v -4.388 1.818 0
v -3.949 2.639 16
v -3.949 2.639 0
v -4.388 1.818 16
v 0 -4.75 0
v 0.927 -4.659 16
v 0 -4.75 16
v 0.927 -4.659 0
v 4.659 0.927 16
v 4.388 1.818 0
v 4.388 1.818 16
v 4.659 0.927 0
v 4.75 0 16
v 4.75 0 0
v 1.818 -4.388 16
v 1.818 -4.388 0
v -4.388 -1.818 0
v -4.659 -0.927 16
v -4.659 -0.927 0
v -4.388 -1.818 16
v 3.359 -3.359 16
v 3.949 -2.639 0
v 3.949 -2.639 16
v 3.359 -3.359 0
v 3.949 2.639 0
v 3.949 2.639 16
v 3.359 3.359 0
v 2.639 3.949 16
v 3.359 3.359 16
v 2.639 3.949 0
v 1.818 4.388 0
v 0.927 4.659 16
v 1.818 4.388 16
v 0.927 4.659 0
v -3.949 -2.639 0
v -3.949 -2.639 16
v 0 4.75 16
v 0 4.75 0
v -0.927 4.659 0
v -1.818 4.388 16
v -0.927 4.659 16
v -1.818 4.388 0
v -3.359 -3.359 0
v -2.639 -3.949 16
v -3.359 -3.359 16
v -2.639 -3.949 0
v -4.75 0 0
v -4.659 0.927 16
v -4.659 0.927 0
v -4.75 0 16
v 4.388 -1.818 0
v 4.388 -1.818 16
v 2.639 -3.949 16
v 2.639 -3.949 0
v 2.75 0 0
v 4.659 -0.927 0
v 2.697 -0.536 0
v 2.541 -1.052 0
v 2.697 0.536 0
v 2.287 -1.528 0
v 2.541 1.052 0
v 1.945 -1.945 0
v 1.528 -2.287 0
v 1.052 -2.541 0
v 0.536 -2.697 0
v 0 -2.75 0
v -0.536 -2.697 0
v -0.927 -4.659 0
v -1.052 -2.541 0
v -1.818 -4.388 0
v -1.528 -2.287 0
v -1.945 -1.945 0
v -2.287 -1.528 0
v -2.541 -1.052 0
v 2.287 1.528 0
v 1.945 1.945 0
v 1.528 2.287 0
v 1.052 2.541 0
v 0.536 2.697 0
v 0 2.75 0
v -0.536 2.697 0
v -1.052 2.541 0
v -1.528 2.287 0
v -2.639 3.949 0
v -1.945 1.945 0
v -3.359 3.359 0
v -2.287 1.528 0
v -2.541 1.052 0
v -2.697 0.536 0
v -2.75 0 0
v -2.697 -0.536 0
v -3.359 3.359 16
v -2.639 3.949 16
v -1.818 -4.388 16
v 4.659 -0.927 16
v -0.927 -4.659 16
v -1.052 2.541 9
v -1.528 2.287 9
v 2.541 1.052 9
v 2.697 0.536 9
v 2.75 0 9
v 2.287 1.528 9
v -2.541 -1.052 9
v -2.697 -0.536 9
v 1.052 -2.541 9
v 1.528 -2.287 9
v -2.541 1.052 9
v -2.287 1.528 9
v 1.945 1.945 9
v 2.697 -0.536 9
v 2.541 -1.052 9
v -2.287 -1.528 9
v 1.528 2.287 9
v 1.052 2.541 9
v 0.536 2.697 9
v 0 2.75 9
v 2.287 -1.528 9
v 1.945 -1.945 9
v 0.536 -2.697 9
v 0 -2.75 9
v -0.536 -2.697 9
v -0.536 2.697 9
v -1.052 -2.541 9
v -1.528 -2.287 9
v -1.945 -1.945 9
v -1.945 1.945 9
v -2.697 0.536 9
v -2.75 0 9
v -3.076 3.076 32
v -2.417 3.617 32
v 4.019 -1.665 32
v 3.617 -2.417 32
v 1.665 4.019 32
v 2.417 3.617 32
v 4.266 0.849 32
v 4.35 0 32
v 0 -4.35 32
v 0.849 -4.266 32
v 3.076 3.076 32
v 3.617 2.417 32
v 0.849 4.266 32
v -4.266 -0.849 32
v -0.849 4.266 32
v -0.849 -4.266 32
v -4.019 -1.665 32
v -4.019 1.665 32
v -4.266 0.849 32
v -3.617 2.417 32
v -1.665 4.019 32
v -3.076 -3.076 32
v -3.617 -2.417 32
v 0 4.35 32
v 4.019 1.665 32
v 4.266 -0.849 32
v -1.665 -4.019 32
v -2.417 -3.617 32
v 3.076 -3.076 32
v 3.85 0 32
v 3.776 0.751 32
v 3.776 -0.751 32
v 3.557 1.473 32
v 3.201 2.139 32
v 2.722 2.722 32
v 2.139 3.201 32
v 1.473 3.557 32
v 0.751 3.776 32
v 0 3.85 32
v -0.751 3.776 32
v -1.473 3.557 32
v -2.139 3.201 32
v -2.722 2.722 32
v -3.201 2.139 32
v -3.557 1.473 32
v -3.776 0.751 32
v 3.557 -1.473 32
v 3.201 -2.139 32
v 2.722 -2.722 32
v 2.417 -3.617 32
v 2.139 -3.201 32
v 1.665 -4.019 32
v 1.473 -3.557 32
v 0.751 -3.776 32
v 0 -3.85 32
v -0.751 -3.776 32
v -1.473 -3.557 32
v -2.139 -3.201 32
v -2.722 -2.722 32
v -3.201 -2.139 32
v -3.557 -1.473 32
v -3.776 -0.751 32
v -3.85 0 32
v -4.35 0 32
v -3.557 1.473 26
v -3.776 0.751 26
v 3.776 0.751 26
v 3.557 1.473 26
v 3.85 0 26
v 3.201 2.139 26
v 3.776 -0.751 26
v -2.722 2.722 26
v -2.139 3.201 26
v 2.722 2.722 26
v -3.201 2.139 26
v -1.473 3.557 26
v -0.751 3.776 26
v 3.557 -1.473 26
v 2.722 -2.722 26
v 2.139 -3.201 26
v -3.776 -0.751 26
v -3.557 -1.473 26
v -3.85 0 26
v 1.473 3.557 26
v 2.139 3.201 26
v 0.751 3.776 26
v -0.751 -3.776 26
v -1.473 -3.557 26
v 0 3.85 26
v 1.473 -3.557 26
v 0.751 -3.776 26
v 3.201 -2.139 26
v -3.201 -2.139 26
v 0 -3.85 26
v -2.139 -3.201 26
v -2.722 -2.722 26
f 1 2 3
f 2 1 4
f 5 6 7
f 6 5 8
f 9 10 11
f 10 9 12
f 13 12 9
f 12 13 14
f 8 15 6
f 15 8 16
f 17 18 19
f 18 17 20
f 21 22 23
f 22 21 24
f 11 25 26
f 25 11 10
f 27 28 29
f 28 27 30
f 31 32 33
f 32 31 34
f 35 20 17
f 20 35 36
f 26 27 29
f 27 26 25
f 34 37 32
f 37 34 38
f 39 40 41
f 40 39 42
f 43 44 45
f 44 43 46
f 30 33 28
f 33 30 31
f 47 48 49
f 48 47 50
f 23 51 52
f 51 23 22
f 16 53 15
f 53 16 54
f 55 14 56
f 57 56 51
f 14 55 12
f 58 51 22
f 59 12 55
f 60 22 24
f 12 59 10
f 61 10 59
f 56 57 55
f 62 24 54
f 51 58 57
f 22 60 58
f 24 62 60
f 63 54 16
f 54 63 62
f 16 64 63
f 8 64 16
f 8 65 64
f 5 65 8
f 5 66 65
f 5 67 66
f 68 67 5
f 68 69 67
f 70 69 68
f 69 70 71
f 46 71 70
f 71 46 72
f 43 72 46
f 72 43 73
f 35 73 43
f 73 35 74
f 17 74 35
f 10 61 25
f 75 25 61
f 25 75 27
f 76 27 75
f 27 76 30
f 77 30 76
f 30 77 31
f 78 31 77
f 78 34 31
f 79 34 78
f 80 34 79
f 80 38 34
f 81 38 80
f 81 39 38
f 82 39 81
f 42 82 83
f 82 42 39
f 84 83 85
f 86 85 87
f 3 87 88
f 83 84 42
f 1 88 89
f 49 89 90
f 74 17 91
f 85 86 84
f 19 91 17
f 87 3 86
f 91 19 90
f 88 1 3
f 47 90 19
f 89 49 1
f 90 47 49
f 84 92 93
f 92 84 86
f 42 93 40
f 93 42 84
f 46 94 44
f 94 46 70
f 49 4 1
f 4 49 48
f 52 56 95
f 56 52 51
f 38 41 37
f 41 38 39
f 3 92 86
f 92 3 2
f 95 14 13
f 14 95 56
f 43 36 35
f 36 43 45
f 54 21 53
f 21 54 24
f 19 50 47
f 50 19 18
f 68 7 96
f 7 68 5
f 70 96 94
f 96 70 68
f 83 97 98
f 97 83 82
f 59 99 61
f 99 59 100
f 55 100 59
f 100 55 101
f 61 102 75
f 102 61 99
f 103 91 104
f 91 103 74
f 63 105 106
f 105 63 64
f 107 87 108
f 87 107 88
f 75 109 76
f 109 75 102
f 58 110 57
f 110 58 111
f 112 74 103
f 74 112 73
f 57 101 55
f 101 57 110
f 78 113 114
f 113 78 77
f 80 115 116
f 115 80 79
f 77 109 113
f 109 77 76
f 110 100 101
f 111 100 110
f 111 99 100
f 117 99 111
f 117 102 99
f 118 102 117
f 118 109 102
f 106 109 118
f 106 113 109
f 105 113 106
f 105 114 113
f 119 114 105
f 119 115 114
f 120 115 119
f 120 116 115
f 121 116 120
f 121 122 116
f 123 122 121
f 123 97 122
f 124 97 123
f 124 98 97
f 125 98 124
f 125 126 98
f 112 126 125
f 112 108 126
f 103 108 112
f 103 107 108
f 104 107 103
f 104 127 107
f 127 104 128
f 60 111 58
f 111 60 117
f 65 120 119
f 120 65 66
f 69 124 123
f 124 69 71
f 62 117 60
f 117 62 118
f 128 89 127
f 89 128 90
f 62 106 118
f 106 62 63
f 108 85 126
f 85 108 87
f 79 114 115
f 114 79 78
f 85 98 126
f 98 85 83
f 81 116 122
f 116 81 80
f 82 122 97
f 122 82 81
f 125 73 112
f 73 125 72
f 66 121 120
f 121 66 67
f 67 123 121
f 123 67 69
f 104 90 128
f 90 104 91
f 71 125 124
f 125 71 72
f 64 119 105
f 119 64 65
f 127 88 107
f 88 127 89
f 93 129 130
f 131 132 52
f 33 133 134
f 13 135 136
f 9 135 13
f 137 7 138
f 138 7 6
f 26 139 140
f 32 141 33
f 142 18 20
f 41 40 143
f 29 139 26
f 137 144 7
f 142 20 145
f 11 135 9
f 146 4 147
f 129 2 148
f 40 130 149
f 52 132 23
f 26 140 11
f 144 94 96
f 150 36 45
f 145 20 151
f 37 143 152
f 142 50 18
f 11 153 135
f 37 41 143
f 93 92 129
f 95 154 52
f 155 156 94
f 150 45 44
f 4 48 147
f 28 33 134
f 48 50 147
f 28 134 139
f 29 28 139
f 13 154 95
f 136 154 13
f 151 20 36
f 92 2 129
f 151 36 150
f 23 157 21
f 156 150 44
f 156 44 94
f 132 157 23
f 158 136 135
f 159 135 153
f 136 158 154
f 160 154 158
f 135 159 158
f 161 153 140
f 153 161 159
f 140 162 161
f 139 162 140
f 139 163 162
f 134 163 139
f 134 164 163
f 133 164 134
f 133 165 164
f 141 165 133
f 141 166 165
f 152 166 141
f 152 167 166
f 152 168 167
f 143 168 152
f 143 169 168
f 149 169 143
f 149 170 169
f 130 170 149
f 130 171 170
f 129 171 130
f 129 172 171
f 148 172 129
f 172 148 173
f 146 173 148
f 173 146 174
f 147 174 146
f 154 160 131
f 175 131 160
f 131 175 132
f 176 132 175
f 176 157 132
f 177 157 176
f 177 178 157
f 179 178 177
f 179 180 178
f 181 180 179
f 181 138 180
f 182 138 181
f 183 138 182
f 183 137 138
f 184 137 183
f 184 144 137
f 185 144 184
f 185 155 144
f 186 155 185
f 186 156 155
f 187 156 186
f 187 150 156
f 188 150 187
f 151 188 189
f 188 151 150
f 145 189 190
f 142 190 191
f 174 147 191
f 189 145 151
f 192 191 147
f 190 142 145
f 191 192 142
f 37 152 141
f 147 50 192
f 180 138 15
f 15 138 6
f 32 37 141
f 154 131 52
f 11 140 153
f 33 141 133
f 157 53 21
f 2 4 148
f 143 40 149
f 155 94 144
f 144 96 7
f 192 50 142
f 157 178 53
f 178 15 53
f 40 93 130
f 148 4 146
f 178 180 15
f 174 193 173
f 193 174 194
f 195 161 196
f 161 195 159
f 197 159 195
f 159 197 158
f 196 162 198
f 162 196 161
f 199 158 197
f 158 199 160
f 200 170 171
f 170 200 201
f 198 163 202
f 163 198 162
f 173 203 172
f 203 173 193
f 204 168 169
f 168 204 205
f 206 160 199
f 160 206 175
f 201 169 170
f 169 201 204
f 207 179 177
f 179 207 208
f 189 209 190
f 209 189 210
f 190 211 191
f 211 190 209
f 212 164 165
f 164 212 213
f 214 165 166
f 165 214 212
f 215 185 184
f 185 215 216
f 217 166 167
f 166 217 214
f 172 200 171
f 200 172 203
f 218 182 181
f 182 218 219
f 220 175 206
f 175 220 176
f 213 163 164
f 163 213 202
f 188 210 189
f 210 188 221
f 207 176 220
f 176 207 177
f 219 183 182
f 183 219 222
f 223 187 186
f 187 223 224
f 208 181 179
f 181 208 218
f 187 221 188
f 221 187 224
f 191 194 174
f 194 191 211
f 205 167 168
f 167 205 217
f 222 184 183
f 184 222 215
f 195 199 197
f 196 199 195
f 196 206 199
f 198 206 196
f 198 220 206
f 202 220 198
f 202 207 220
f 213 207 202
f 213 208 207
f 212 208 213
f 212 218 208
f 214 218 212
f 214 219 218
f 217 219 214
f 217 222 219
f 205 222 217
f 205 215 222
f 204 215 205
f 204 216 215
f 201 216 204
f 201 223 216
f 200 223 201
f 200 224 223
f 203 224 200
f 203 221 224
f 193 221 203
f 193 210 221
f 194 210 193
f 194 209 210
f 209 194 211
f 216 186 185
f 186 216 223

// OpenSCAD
//-- Parametric Traxxas 5347 carbon fiber rod connector
//-- Parametric: rod diameter can be adjusted as well as length and tolerance
//-- Assembly requires epoxy glue.
//-- AndrewBCN - Barcelona - March 2015
//-- GPLV3
//-- Please read the terms of the GPLV3 and please comply with it
//-- if remixing this part. Thank you.


// Parameters

// Rod diameter
Rod_diam=5; // [5:8]

// Part additional length
add_len=30; // [30:40]

// Print tolerance
tolerance=0.5; // [0.0,0.1,0.2,0.3,0.5]

/* [Hidden] */
$fn=32;

diam1=Rod_diam+tolerance;
diam2=diam1+4; // 2mm walls
diam3=7.2+tolerance; // Traxxas diameter
diam4=diam3+1;

// really simple code

// bottom
difference() {
  cylinder(r=diam2/2, h=add_len-14);
  translate([0,0,-0.1]) cylinder(r=diam1/2, h=9.1);
}
// top
difference() {
  translate([0,0,add_len-14]) cylinder(r1=diam2/2, r2=diam4/2, h=16);
  translate([0,0,add_len-4]) cylinder(r=diam3/2, h=8);
}
